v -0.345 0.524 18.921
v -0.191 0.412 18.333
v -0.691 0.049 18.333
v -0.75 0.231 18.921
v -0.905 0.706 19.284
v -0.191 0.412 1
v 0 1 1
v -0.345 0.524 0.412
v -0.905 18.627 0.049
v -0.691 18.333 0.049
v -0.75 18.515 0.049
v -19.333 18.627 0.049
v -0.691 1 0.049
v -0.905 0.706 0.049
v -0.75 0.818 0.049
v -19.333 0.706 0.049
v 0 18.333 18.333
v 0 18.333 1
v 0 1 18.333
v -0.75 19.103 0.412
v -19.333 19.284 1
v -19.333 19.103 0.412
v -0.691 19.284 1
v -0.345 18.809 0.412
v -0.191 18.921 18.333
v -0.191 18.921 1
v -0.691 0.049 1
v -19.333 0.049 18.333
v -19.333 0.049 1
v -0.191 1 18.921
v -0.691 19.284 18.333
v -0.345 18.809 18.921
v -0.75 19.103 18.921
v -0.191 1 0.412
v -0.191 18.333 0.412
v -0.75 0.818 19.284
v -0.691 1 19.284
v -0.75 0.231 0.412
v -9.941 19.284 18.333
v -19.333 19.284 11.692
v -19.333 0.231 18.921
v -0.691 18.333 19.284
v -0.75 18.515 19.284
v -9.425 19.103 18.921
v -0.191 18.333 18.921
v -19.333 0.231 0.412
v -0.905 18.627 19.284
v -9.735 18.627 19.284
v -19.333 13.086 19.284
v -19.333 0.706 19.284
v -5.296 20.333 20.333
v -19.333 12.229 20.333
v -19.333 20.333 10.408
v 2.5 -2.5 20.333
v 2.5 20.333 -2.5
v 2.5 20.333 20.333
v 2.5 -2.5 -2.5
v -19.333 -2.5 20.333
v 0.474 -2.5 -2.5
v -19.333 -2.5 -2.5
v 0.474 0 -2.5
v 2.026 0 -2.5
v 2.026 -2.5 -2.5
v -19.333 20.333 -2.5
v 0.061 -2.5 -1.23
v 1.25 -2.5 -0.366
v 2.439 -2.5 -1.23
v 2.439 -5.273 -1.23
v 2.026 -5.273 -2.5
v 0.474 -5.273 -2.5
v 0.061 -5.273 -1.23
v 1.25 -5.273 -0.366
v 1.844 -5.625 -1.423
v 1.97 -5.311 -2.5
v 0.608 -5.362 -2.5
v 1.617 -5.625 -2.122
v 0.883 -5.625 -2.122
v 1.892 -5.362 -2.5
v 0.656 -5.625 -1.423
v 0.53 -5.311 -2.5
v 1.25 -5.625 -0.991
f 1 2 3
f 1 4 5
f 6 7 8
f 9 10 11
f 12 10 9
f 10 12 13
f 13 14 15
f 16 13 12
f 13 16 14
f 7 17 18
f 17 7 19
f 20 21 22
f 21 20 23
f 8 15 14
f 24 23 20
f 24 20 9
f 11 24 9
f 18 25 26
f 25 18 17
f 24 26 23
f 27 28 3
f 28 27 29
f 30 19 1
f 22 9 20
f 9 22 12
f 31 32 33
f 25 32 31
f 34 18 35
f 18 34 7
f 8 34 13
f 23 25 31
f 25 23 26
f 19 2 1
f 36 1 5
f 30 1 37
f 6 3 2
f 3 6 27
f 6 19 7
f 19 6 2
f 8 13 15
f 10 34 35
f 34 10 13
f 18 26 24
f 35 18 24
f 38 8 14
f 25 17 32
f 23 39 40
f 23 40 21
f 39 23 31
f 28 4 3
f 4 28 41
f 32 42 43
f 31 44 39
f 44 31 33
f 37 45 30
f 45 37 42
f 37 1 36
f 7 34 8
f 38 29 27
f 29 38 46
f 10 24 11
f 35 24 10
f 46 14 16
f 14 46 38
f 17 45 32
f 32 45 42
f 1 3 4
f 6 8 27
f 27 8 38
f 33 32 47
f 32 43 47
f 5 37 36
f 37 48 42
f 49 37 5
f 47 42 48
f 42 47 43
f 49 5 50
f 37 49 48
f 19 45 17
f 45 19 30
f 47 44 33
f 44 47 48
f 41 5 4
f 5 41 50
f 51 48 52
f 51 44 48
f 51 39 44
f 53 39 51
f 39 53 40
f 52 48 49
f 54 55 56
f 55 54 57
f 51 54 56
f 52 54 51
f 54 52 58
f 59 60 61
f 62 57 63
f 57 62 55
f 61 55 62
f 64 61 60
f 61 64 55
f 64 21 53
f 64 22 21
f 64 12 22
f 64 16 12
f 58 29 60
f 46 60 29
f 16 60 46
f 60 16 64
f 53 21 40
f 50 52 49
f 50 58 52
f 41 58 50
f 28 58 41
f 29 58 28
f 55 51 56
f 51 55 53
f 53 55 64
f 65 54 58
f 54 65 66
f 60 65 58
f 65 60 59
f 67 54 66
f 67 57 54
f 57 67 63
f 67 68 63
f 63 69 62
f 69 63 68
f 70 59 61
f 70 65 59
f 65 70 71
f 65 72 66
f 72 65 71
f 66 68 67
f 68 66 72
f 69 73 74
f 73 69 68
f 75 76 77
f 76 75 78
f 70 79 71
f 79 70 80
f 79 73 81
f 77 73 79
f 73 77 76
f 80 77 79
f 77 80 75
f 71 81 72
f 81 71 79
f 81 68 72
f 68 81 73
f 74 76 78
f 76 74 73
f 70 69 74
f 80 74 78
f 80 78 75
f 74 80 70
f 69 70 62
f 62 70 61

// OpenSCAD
// file: gear.scad
/**
 * Copyright 2018 Mike and Nathan Fairhurst. See LICENSE for licensing.
 */
include <constants.scad>;
use <util.scad>;

// Begin how to print this piece (orientation, etc)

// Begin modules that can be used to assemble this piece in solver_3.scad

// Get the size of a gear (circumference) without the teeth,
// based on teeth size and num teeth
function gear_inner_circumference(teeth_size, num_teeth)
  = teeth_size * num_teeth;

// Get the size of a gear (radius) without the teeth, based on
// teeth size and num teeth
function gear_inner_radius(teeth_size, num_teeth)
  = gear_inner_circumference(teeth_size, num_teeth) / 3.14159 / 2;

// Get the size of a gear (radius) including the teeth, based on
// teeth size and num teeth
function gear_outer_radius(teeth_size, num_teeth)
  = gear_inner_radius(teeth_size, num_teeth)
    + gear_tooth_additional_radius(teeth_size);

// Get the size of a gear tooth such that it is on a gear with num_teeth
// and fits inside (teeth included) outer_radius.
function gear_size_for_outer_radius_and_teeth_count(outer_radius, num_teeth)
  = let(basic_teeth_size = other_radius*2 / num_teeth)
    basic_teeth_size
    * ((outer_radius - gear_tooth_additional_radius(basic_teeth_size))
       / outer_radius);

// Get the additional radius on a gear by its tooth size. Since
// these are right triangles, we simply cut one side in half to get
// a right angle and use pythag.
function gear_tooth_additional_radius(tooth_size)
  = sqrt(sqr(tooth_size) - sqr(tooth_size/2));

// Create a gear based on number and size of teeth
module gear(teeth_size, num_teeth, thickness) {
  radius = gear_inner_radius(teeth_size, num_teeth);
  linear_extrude(thickness) {
    circle(radius, $fn=num_teeth);
    for (i=[1:num_teeth]) {
      rotate([0, 0, 360/num_teeth*i]) translate([radius, 0]) circle(teeth_size, $fn=3);
    }
  }
}

// A gear which must fit some number of teeth within some outer radius,
// accepts a number of teeth and a thickness as well.
module fixed_outer_size_gear(outer_radius, num_teeth, thickness) {
  basic_teeth_size = outer_radius*2 / num_teeth;
  inner_gear_size = outer_radius - gear_tooth_additional_radius(basic_teeth_size);
  adjustment_ratio = inner_gear_size / outer_radius;
  gear(basic_teeth_size * adjustment_ratio, num_teeth, thickness);
}
// file: belt.scad
/**
 * Copyright 2018 Mike and Nathan Fairhurst. See LICENSE for licensing.
 */
include <constants.scad>;
use <util.scad>;

// Begin how to print this piece (orientation, etc)

// Begin modules that can be used to assemble this piece in solver_3.scad

// A simple belt preview module. Simply accepts some number of gears, and
// builds a belt that connects them.
//
// Example: a 2mm thick belt connecting three gears in a square
//   belt(2) mirrored([x, y]) gear(.5, 30, 5);
//
// Doesn't yet draw the teeth, and makes some assumptions:
// - Assumes all gears are level in the z axis
// - Assumes all gears are the same thickness
// - Has the same limitations as [hull] (assumes no backtracking).
module belt(size=2) {
  difference() {
    hull() minkowski() {
      children();
      cylinder(0.00001, r=size);
    }
    down(0.1) scale([1,1,2]) hull() children();
  }
}

// This an approximation for a transcendental equation, but seems to work well
// see this post: https://math.stackexchange.com/questions/123361
function gear_center_distance(belt_length, gear_size1, gear_size2) =
  let(diff=abs(gear_size1 - gear_size2))
  let(tangent_length=
    (belt_length - PI*diff + sqrt(sqr(PI*diff - belt_length) - 16*sqr(diff))) / 4)
  sqrt(sqr(diff) + sqr(tangent_length));
// file: arm.scad
/**
 * Copyright 2018 Mike and Nathan Fairhurst. See LICENSE for licensing.
 */
include <constants.scad>;
use <util.scad>;
use <gear.scad>;

// Begin config specific to this piece.
arm_length = 100;
width = 20;
grip_width = 2;
extend_retract_gear_size = 1;

// Begin how to print this piece (orientation, etc)
rotate([0, 90, 0]) arm();

// Begin modules that can be used to assemble this piece in solver_3.scad
module arm(include_gears=true) {
  rotate([0, 270, 0]) {
    translate([0, 0, cube_size/2])
      if (include_gears)
        opposing_gears(arm_length, width, extend_retract_gear_size);
      else cylinder(d=width, arm_length);
    difference() {
      translate([0, 0, cube_size/3/2 + grip_width / 2])
        ccube([
          cube_size + grip_width * 2,
          cube_size / 3,
          cube_size/3 * 2 + grip_width
        ], x + y + z);
      ccube(cube_size, x + y + z);
    }
  }

}

module opposing_gears(length, width, extend_retract_gear_size) {
  intersection() {
    fixed_outer_size_gear(width, 10, length);
    ccube([width, width, length], y);
  }
  difference() {
    movable_cylinder(extend_retract_gear_size, width, length);
    ccube([width, width, length], y);
  }
}

module movable_cylinder(teeth_size = 1, width = width, length=arm_length) {
  iters = floor(length / teeth_size);

  radial_offset = gear_tooth_additional_radius(teeth_size) + teeth_size /2;

  intersection() {
    // restrict to the actual length
    ccube([width, width, length], x+y);
    // each tooth
    for (i=[0:iters]) {
      up(i * teeth_size)
      rotate_extrude()
      translate([width / 2 - radial_offset, 0, 0])
      circle(teeth_size, $fn=3);
    }
  }

  // without this its hollow
  cylinder(r=width / 2 - radial_offset, h=length);
}
// file: pin.scad
/**
 * Copyright 2018 Mike and Nathan Fairhurst. See LICENSE for licensing.
 */
include <constants.scad>;
use <util.scad>;

pin(10,2);

// A shape that can be used for push in parts
module pin(height, radius) {
  inner_height = height * 0.9375;
  cap_height = height - inner_height;
  difference() {
    translate([radius*sqrt(2)/2, 0, 0])
      union() {
        cylinder(h=inner_height, r=radius);
        up(inner_height)
          cylinder(h=cap_height, r1=radius, r2=radius/2);
      }
    translate([-height*2, 0, 0])
      ccube(height*2, y + z);
  }
}
// file: frame.scad
/**
 * Copyright 2018 Mike and Nathan Fairhurst. See LICENSE for licensing.
 */
include <constants.scad>;
use <util.scad>;
use <cube_holder.scad>;
use <arm.scad>;
use <belt.scad>;

thickness = 4;
width = 30;
height_at_front = 120;
height_at_back = 140;
cube_to_arm_gap = 60;
cube_to_arm_len = 80;

cube_spinner_belt_size = 120;

cube_spinner_servo_gear_center_distance = gear_center_distance(
                                cube_spinner_belt_size,
                                servo_gear_thickness,
                                servo_gear_thickness * 2);

cube_spinner_servo_offset = sqrt(sqr(cube_spinner_servo_gear_center_distance), sqr(width + servo_block_size[1]/2));

cube_spinner_servo_support_offset = servo_block_size[0]/2 + servo_screw_offsets[1]/2;
cube_spinner_servo_support_height = servo_gear_thickness
                           + servo_flange_offset
                           + thickness
                           - servo_flange_thickness;

// Begin how to print this piece (orientation, etc)
rotate([90, 0, 0]) frame();

// Begin modules that can be used to assemble this piece in solver_3.scad

module above_frame() {
  up(thickness) children();
}

module frame() {
  translate([-width/2, 0, 0])
    ccube([cube_to_arm_len + width/2, width, thickness], y);
  translate([cube_spinner_servo_offset - cube_spinner_servo_support_offset, 0, 0])
    cube_spinner_servo_support();
  translate([cube_spinner_servo_offset + cube_spinner_servo_support_offset, 0, 0])
    cube_spinner_servo_support();
  difference() {
    union() {
      translate([cube_to_arm_gap, 0, 0])
        ccube([thickness, width, height_at_front], y);
      translate([cube_to_arm_len, 0, 0])
        ccube([thickness, width, height_at_back], y);
    }
    above_cube_holder() onto_point(cube_size) arm(include_gears=false, $fn=100);
  }
}

module cube_spinner_servo_support() {
  to_center([0, width, 0], y) {
      ccube([thickness, width / 2, cube_spinner_servo_support_height], x);
    translate([0, 0, cube_spinner_servo_support_height - thickness])
      ccube([thickness, width + servo_block_size[1], thickness], x);
  }
}

module cube_spinner_servo_placement() {
  translate([cube_spinner_servo_offset, width/2 + servo_block_size[1]/2, 0])
    rotate([0, 180, 0])
    children();
}
// file: util.scad
/**
 * Copyright 2018 Mike and Nathan Fairhurst. See LICENSE for licensing.
 */

function is_number(x) = abs(x)!=undef;
function sqr(x) = x*x;
function sqrt(x) = pow(x, 0.5);

// Constants specific to this file
cube_point_rotation = [45, 35.264, 180];

// Modules to be used by all parts

// Create a cube balanced on a point. If you want a specialty
// cube, you can use [onto_point] and pass in the size.
module cube_on_point(cube_size) {
  onto_point(cube_size) cube(cube_size, center=true);
}

// Wrap around a cube of [size], and it will be placed on a
// point. Make sure size is accurate, or, when you can, use
// [cube_on_point].
module onto_point(cube_size) {
  translate([0, 0, pow(pow(cube_size/2, 2)*3, 1/2)])
    rotate(cube_point_rotation)
    children();
}

// A cube with rounded corners, with centering available as
// well, via [ccube].
module rounded_cube(size, rounding, center) {
  //realdims = is_number(dims) ? [dims, dims, dims] : dims;
  minkowski() {
    ccube(size - rounding*2, center);
    sphere(r=rounding, center=true, $fn=10);
  }
}

// Move children up by z. Just cleaner than creating a 3d
// vector transform.
module up(z) {
  translate([0, 0, z]) children();
}

// Move children down by z. Just cleaner than creating a 3d
// vector transform.
module down(z) {
  translate([0, 0, -z]) children();
}

// Convenience function for creating a partially centered cube.
//
// [ccube] stands for "centered cube." Rather than having only
// two options (center on all axes or none), the axes upon which
// the cube should be centered can be passed in via the
// constants [x], [y], and [z], from constants.scad. Note you
// can add & subtract these values for a clean API.
//
// Based on [to_center], so if you don't want a cube, or want
// to recreate the transformation of a different [ccube], you
// can use that.
//
// Example: a cube of width 10, centered on x & y
//   ccube(10, x + y)
module ccube(dims, axes) {
  to_center(dims, axes) cube(dims);
}

// The transformation of [ccube], abstracted so that it can be
// used for shapes other than a regular cube.
module to_center(dims, axes) {
  realdims = is_number(dims) ? [dims, dims, dims] : dims;
  translate([
    -realdims[0]/2 * axes[0], 
    -realdims[1]/2 * axes[1], 
    -realdims[2]/2 * axes[2]
  ]) children();
}

// Take a child, and mirror it along the sets of vectors provided. The
// vectors can be the constants [x], [y], and [z] from constants.scad.
//
// Example: Four cubes, evenly mirrored around x and y
//   mirrored([x, y]) translate([10, 10, 0]) cube(1);
module mirrored(vector_set, index = 0) {
  if (index != len(vector_set)) {
    mirror(vector_set[index]) mirrored(vector_set, index + 1) children();
    mirrored(vector_set, index + 1) children();
  } else {
    children();
  }
}
// file: constants.scad
/**
 * Copyright 2018 Mike and Nathan Fairhurst. See LICENSE for licensing.
 */

// Constants to be used by all models
cube_size = 56.5;
$tol = 0.4;
layer_count = 3;
cube_rounding = 1;
servo_block_size=[26.5,15,30];
servo_flange_length=13;
servo_flange_thickness=1.5;
servo_flange_offset=8;
servo_screw_offsets=[3, 5];
servo_screw_size = 4;
servo_gear_teeth_size = 1;
servo_gear_num_teeth = 12;
servo_gear_thickness = 5;

// Dimensional values for use with [ccube], etc.
x = [1, 0, 0];
y = [0, 1, 0];
z = [0, 0, 1];
// main file
/**
 * Copyright 2018 Mike and Nathan Fairhurst. See LICENSE for licensing.
 */
include <constants.scad>;
use <util.scad>;
use <frame.scad>;
use <pin.scad>;

// Begin config specific to this piece.
margin = 0.5;
thickness = 2.5;
embedded_thickness = 1;

// Begin how to print this piece (orientation, etc)
cube_holder();

// Begin modules that can be used to assemble this piece in solver_3.scad

module above_cube_holder() {
  up(servo_gear_thickness) above_frame() children();
}

module cube_holder(hollow=true) {
  piece_size = cube_size / 3 + margin;
  holder_open_size = piece_size + thickness;
  holder_closed_size = piece_size + thickness + embedded_thickness;
  translate([-piece_size/2,piece_size/2,piece_size/2]) {
    difference() {
      translate([thickness/2, (embedded_thickness-thickness)/2, (embedded_thickness-thickness)/2])
        ccube([holder_open_size, holder_closed_size, holder_closed_size], x+y+z);
      if (hollow) {
        rounded_cube(piece_size, cube_rounding, x+y+z);
        translate([-thickness, 0, 0]) rounded_cube(piece_size, cube_rounding, x+y+z);
        onto_point()
          translate([0, 0, holder_closed_size])
          ccube(holder_open_size, x+y+z);
      }
    }
  }
  pin_radius = thickness/2;
  translate([thickness - pin_radius, 0, -thickness])
    rotate(90, x) // rotate the pin so it prints flat
    rotate(90, z) // turn the pin so that it lays on a face
    pin(thickness*9/4, pin_radius);
}
